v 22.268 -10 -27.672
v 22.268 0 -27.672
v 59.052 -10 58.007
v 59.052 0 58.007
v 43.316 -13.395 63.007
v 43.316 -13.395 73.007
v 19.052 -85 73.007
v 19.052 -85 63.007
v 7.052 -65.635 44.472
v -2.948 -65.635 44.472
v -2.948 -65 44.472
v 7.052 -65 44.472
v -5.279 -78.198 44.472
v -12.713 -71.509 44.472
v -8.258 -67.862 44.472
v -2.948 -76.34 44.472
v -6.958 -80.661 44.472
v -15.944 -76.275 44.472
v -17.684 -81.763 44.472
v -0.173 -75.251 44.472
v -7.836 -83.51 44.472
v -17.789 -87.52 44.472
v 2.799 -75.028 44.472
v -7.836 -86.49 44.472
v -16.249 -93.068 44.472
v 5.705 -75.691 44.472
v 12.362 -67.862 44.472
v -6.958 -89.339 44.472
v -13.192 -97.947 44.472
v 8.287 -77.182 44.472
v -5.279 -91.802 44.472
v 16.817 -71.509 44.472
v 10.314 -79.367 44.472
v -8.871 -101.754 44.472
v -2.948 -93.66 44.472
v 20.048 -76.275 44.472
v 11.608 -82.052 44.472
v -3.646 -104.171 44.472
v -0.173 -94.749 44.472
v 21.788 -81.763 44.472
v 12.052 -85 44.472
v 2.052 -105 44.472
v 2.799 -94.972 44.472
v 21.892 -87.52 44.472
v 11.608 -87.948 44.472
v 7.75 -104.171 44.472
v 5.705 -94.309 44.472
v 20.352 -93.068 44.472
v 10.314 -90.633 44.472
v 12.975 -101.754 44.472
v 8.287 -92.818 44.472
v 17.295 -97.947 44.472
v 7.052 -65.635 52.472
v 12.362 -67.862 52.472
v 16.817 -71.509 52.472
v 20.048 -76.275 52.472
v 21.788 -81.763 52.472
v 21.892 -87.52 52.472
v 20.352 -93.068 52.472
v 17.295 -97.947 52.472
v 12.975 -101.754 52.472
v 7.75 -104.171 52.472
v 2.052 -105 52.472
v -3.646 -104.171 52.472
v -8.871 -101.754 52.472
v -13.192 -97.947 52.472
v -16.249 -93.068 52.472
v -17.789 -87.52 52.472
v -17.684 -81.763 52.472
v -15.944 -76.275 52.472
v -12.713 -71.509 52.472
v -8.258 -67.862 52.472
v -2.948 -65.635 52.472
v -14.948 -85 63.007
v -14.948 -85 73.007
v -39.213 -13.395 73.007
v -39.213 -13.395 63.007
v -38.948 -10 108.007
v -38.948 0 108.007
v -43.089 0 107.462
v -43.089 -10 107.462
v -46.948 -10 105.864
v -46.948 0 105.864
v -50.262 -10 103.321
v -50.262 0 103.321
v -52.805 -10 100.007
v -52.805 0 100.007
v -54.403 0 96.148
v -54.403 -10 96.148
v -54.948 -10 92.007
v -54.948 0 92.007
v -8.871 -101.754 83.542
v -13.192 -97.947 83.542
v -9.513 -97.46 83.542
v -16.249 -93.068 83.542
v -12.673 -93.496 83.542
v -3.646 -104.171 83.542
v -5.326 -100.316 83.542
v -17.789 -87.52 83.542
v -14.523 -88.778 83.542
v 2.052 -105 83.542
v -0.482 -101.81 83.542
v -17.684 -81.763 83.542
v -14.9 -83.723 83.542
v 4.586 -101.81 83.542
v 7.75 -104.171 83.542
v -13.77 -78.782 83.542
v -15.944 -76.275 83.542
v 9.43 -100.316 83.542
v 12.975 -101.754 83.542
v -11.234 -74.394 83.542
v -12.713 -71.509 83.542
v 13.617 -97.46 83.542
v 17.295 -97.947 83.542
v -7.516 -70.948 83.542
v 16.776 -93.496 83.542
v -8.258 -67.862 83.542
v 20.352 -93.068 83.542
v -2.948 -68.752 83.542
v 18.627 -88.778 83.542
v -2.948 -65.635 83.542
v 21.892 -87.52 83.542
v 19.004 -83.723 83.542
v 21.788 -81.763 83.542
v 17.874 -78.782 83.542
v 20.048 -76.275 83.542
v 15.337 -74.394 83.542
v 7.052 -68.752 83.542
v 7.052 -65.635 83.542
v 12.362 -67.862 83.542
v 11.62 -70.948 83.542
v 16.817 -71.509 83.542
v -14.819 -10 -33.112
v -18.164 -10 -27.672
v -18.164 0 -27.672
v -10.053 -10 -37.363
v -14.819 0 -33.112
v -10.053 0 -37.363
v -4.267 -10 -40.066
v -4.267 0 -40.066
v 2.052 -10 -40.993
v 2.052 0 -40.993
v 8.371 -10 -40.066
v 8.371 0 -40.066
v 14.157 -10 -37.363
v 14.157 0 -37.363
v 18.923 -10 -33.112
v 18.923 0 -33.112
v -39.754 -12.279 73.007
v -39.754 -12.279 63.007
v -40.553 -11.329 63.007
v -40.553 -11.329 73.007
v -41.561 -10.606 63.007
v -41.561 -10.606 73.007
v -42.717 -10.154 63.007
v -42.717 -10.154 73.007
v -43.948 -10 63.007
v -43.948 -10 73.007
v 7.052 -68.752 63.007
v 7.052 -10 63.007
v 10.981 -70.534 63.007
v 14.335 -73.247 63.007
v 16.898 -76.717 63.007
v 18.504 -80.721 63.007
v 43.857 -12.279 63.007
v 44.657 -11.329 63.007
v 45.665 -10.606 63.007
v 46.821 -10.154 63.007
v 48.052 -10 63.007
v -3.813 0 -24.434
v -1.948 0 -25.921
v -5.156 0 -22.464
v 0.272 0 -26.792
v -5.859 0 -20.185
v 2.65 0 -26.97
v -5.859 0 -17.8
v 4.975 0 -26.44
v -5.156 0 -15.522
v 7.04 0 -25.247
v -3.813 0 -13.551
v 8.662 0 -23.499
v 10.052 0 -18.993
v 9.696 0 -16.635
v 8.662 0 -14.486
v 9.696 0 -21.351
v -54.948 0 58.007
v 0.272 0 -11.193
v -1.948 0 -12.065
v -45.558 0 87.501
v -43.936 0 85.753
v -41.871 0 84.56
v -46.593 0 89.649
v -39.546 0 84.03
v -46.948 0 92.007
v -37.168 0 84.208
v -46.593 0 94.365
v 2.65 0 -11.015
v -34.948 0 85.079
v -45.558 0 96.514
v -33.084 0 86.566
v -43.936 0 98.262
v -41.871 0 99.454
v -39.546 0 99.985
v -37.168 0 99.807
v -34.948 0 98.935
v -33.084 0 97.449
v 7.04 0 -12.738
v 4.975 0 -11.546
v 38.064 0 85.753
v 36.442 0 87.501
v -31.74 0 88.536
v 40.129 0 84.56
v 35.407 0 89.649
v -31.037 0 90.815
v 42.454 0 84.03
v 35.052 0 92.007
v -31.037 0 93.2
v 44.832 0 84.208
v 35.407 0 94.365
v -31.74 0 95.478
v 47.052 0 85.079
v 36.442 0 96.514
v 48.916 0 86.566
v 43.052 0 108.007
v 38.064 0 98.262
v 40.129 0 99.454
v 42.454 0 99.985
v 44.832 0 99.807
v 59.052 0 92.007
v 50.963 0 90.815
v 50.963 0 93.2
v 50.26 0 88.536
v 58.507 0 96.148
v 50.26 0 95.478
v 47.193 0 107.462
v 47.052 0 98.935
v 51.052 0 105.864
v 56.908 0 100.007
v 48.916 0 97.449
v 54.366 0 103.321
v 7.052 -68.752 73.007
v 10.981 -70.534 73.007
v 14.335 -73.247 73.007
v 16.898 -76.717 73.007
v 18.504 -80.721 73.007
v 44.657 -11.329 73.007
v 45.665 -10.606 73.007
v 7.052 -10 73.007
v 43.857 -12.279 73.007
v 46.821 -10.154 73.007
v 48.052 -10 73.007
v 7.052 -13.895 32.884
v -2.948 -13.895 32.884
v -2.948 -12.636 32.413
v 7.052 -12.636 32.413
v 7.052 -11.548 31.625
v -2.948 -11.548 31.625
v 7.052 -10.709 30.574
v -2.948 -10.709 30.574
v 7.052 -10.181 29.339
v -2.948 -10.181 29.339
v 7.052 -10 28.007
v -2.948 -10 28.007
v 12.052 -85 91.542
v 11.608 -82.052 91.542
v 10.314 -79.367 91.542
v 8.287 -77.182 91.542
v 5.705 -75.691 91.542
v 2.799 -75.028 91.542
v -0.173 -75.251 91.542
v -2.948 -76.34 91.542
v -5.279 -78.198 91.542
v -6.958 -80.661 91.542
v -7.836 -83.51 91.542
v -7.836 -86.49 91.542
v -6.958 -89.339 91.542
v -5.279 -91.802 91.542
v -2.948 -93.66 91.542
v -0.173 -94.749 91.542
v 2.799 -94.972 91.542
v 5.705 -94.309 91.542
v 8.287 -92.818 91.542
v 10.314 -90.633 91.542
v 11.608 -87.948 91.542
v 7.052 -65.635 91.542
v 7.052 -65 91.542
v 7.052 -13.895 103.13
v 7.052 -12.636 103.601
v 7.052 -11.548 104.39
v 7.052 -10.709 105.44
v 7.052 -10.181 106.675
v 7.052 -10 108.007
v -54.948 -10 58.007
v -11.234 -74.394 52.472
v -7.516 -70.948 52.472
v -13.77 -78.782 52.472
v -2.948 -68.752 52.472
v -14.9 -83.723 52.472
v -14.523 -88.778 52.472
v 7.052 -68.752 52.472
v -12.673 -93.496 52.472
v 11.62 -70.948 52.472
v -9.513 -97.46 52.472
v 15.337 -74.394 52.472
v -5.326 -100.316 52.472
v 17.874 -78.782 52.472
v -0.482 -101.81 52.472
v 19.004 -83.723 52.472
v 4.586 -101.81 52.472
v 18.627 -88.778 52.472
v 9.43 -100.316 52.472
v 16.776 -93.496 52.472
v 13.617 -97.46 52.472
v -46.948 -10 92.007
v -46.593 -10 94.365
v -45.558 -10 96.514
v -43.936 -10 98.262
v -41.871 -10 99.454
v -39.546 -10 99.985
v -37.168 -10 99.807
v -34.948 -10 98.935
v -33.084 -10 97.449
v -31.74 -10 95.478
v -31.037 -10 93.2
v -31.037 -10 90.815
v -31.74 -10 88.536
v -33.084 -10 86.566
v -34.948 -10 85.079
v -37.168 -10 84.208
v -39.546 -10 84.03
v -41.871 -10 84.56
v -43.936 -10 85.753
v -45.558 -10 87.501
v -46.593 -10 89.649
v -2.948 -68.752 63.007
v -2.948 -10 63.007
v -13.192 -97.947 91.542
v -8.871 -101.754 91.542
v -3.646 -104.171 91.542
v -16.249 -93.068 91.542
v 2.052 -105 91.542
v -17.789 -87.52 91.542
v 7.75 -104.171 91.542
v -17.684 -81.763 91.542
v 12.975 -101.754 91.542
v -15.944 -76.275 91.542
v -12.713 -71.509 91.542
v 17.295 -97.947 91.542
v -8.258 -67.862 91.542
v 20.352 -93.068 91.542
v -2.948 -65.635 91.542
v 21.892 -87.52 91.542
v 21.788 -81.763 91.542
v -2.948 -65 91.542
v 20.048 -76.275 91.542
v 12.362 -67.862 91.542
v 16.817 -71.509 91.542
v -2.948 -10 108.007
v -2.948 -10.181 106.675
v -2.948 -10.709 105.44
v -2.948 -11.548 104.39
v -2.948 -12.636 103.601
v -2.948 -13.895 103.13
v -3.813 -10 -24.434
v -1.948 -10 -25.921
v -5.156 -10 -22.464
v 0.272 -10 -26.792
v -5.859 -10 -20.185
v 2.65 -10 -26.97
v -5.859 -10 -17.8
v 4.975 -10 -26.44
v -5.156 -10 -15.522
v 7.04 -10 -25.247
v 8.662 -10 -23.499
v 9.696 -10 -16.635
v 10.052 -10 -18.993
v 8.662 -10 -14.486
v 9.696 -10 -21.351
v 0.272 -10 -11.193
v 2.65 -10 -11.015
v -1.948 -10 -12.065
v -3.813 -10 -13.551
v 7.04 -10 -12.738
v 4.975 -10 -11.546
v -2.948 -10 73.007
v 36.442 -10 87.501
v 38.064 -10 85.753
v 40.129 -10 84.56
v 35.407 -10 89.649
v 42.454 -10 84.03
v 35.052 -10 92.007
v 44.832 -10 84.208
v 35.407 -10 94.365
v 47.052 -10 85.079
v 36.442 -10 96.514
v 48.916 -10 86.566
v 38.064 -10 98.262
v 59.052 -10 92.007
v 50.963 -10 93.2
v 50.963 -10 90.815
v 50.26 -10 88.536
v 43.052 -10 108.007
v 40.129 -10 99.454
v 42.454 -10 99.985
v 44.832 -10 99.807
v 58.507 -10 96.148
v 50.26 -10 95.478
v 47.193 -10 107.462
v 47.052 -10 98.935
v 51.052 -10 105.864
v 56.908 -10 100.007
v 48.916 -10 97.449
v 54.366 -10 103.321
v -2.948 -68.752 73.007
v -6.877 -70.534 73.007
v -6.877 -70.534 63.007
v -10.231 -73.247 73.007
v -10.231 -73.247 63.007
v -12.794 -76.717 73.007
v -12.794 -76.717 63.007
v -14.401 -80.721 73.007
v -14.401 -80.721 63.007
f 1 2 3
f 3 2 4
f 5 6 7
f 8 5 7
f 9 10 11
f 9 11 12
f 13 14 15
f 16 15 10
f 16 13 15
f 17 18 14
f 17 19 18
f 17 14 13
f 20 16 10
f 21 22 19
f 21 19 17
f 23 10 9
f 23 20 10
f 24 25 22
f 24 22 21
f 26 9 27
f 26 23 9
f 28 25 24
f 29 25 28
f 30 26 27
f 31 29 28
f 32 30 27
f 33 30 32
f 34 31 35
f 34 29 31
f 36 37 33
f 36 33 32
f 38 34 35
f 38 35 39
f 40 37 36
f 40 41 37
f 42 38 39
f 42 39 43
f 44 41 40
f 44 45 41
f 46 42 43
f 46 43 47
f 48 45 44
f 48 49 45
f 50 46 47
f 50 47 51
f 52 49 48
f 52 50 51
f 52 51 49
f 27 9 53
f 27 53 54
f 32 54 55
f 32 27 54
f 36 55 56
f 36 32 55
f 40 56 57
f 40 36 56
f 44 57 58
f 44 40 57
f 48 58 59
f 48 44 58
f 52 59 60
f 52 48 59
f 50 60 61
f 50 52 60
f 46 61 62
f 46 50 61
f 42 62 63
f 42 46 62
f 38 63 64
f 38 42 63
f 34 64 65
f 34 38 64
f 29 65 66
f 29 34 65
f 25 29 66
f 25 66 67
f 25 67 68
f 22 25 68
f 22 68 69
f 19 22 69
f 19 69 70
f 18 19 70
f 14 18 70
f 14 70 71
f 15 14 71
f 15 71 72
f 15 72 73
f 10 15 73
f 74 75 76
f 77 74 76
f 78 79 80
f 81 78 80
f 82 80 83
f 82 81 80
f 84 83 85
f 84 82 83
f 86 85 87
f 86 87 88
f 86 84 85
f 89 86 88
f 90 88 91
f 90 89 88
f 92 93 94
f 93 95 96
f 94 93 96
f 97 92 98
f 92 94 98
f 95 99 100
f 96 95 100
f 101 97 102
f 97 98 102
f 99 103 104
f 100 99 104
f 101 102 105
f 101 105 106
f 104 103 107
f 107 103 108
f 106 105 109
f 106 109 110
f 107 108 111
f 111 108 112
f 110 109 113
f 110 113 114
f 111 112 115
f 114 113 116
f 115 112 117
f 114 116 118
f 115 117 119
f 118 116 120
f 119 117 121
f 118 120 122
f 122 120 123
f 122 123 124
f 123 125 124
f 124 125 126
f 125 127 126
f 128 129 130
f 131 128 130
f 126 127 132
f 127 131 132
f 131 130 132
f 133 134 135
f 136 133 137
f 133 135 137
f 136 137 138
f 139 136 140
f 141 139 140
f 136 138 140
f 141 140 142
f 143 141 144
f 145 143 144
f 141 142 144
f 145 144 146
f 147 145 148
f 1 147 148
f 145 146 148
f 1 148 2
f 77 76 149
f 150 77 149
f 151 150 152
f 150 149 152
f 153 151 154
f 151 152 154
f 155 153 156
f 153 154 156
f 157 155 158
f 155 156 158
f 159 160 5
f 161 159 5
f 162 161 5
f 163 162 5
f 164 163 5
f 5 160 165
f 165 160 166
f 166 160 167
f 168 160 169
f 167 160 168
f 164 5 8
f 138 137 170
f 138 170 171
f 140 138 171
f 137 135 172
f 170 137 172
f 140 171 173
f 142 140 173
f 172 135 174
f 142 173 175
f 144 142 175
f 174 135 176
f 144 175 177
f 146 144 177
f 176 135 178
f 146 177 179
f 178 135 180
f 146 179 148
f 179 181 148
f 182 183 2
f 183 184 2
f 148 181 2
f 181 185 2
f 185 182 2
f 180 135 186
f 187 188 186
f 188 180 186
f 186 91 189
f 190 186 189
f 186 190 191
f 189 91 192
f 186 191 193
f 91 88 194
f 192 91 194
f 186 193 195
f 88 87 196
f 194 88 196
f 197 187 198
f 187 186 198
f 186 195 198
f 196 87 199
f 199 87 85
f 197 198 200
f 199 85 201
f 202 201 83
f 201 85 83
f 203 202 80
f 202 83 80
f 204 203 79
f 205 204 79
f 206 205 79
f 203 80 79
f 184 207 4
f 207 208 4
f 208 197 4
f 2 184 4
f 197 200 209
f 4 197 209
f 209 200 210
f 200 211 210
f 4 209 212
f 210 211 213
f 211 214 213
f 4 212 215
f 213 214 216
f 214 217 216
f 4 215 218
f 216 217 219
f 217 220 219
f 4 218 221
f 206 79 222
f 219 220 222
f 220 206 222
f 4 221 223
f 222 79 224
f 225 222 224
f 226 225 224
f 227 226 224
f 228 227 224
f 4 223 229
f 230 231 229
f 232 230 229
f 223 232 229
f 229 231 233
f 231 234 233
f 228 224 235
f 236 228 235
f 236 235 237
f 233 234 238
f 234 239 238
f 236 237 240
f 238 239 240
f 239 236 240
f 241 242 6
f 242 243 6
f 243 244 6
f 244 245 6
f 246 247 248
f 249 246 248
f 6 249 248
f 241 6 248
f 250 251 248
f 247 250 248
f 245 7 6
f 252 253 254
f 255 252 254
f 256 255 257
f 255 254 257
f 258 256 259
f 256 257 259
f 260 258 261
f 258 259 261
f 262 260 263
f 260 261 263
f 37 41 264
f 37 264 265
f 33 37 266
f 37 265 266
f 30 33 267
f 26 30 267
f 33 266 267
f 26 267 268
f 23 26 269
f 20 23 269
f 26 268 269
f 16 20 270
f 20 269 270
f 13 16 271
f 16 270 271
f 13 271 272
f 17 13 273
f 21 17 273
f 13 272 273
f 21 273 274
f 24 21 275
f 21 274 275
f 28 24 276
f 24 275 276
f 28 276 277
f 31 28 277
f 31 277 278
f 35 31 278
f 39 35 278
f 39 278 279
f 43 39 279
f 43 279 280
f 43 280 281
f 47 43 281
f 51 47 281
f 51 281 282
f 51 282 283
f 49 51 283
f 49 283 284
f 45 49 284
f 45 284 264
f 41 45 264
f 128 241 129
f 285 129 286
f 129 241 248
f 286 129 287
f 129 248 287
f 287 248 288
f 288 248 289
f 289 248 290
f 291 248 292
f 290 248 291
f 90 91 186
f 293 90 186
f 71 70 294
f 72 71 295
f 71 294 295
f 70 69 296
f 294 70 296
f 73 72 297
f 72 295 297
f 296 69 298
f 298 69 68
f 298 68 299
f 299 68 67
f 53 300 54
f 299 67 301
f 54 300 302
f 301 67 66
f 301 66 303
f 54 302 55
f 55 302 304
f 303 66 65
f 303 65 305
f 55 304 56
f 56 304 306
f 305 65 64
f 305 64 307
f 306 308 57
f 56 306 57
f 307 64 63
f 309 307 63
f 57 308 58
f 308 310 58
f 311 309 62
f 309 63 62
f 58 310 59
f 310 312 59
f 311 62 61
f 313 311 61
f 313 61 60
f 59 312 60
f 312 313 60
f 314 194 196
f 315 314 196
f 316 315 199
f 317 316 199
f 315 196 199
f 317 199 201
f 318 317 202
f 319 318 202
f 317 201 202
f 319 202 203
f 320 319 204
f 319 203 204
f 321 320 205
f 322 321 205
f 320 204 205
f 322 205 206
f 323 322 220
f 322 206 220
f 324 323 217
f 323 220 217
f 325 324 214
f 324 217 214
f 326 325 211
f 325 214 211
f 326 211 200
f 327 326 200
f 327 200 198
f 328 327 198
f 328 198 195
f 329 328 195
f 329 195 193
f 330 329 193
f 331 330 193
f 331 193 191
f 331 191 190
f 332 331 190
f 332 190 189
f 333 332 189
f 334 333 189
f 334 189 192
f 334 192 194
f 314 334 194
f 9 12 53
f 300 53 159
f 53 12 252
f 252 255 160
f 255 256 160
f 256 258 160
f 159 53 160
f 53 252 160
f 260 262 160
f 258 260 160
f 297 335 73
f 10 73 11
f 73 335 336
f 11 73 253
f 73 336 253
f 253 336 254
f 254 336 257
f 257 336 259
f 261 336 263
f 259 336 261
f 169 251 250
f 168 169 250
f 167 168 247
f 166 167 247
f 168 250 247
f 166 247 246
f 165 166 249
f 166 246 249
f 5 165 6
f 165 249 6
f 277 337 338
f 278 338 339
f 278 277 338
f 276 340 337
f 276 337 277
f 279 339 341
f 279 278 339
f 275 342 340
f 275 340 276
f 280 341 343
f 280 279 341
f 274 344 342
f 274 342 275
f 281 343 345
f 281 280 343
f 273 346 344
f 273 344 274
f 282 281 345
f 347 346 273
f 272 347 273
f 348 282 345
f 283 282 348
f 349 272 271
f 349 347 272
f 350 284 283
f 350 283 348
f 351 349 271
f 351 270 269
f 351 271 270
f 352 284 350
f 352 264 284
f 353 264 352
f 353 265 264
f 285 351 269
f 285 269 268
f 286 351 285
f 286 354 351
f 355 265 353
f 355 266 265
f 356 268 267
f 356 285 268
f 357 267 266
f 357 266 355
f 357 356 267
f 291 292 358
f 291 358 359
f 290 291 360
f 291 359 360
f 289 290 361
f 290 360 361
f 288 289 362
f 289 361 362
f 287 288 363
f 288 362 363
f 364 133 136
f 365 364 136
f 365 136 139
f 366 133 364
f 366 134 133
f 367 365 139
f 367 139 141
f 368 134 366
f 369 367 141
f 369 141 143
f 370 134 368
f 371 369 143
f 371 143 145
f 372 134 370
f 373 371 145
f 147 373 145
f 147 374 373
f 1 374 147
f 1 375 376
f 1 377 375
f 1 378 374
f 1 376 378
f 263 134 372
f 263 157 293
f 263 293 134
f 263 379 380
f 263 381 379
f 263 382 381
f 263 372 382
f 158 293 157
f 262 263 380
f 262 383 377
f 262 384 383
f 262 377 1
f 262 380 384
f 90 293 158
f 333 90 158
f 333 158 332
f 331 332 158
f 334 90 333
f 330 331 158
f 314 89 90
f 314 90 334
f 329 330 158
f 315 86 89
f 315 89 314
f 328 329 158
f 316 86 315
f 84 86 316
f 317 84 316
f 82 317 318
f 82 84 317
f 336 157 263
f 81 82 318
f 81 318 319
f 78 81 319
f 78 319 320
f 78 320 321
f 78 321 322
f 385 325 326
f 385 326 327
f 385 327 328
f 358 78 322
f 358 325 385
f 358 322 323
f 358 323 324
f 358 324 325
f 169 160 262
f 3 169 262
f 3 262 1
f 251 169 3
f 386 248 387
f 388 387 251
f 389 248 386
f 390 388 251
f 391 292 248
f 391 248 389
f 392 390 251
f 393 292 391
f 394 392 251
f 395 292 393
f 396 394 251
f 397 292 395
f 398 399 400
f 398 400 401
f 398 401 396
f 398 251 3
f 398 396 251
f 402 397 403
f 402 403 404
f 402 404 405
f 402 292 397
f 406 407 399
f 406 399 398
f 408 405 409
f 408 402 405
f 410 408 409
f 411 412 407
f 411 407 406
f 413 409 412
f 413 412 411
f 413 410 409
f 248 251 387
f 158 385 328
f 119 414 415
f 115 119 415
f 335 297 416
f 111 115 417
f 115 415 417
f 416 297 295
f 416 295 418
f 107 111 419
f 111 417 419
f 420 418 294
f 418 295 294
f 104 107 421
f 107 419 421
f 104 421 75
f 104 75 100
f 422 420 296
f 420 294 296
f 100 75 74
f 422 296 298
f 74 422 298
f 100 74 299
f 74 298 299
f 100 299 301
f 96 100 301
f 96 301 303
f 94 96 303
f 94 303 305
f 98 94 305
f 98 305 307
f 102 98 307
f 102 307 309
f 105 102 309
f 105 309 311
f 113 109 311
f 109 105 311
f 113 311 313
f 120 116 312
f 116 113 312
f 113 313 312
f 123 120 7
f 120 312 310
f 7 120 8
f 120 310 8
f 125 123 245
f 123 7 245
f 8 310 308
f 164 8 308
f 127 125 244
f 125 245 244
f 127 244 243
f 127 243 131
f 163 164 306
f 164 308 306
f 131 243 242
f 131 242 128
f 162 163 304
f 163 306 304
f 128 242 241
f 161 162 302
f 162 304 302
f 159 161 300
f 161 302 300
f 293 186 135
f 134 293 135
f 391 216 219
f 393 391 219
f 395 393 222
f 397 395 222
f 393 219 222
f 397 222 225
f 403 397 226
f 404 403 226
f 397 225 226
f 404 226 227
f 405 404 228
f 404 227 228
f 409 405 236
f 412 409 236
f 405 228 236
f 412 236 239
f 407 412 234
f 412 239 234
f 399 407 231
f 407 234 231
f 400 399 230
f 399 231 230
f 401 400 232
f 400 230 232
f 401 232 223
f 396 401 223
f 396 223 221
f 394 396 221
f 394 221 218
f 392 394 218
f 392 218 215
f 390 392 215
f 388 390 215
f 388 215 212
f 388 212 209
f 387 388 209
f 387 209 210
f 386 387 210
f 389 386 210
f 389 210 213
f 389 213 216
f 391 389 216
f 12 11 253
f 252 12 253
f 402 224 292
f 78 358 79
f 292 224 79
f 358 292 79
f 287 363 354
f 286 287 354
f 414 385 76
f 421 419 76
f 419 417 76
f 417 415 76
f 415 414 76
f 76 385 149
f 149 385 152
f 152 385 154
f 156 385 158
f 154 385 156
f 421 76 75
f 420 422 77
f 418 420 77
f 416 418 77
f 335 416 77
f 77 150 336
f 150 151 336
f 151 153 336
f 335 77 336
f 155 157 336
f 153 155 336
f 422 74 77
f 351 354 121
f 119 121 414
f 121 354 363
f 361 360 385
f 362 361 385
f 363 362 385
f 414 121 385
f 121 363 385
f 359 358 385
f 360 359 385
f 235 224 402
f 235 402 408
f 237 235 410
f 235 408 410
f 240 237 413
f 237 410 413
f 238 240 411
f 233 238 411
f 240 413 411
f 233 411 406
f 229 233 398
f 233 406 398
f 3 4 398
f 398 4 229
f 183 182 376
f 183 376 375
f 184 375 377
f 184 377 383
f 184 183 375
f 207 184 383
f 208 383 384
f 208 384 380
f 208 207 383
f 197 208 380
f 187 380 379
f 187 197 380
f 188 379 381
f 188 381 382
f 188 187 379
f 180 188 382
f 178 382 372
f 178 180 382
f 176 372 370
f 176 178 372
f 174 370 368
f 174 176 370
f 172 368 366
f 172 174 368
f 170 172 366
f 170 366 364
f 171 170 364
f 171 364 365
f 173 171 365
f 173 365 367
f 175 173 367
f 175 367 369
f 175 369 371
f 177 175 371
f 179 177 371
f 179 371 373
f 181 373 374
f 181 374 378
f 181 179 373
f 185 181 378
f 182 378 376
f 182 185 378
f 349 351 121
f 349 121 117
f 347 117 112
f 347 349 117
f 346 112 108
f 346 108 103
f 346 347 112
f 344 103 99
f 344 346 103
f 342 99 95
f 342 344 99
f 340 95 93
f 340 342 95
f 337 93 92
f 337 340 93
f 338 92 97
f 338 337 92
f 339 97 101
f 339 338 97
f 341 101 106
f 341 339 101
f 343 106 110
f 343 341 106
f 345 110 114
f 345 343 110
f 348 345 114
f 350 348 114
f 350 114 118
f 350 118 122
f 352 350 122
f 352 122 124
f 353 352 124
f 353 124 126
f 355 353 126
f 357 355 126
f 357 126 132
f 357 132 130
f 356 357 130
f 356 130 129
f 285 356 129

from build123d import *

# Parameters (mm, degrees)
F0_R      = 8
F1_DEPTH  = 10
F2_R      = 16
F3_R      = 8
F4_DEPTH  = 10.001
F6_DEPTH  = 75
F8_DEPTH  = 62.001
F9_R      = 20
F10_DEPTH = 8
F11_R     = 20
F12_DEPTH = 8
F13_R     = 17
F14_DEPTH = 38
F15_R     = 10
F16_DEPTH = 114.001
F17_W     = 12
F17_H     = 10
F18_DEPTH = 75
F19_R     = 10
F20_DEPTH = 132.536
F22_DEPTH = 10


with BuildPart() as f1:
    # F0 (on Front) → F1 (new body)
    with BuildSketch(Plane.XZ):
        with BuildLine():
            Line((59.051879, 108.007187), (-54.948121, 108.007187))
            Line((-54.948121, 108.007187), (-54.948121, 58.007187))
            Line((-54.948121, 58.007187), (-18.163779, -27.671937))
            ThreePointArc((-18.163779, -27.671937), (2.051879, -40.992813), (22.267536, -27.671937))
            Line((22.267536, -27.671937), (59.051879, 58.007187))
            Line((59.051879, 58.007187), (59.051879, 108.007187))
        make_face()
        with Locations((2.051879, -18.992813)):
            Circle(F0_R, mode=Mode.SUBTRACT)
    extrude(amount=F1_DEPTH)

    # F2
    f2_edges = [f1.edges().sort_by_distance(p)[0] for p in [
        (-54.948121, -5, 108.007187),
        (59.051879, -5, 108.007187),
    ]]
    fillet(f2_edges, radius=F2_R)

    # F3 (on face) → F4 (cut, through all)
    with BuildSketch(Plane(origin=(0, 0, 0), x_dir=(-1, 0, 0), z_dir=(0, 1, 0))):
        with Locations((-43.051879, 92.007187)):
            Circle(F3_R)
        with Locations((38.948121, 92.007187)):
            Circle(F3_R)
    extrude(amount=-F4_DEPTH, mode=Mode.SUBTRACT)

    # F5 (on face) → F6 (join)
    with BuildSketch(Plane.XZ.offset(10)):
        Polygon((7.051879, 108.007187), (2.051879, 108.007187), (-2.948121, 108.007187), (-2.948121, 28.007187), (7.051879, 28.007187), align=None)
    extrude(amount=F6_DEPTH)

    # F7 (on face) → F8 (cut, through all)
    with BuildSketch(Plane(origin=(-2.948121, 0, 0), x_dir=(0, -1, 0), z_dir=(-1, 0, 0))):
        with BuildLine():
            Line((85, 108.007187), (10, 108.007187))
            ThreePointArc((10, 108.007187), (11.093214, 104.886516), (13.894876, 103.130274))
            Line((13.894876, 103.130274), (65, 91.542187))
            Line((65, 91.542187), (85, 91.542187))
            Line((85, 91.542187), (85, 108.007187))
        make_face()
        with BuildLine():
            ThreePointArc((13.894876, 32.8841), (11.093214, 31.127858), (10, 28.007187))
            Line((10, 28.007187), (85, 28.007187))
            Line((85, 28.007187), (85, 44.472187))
            Line((85, 44.472187), (65, 44.472187))
            Line((65, 44.472187), (13.894876, 32.8841))
        make_face()
    extrude(amount=-F8_DEPTH, mode=Mode.SUBTRACT)

    # F9 (on face) → F10 (join)
    with BuildSketch(Plane.XY.offset(91.542187)):
        with Locations((2.051879, -85)):
            Circle(F9_R)
    extrude(amount=-F10_DEPTH)

    # F11 (on face) → F12 (join)
    with BuildSketch(Plane(origin=(0, 0, 44.472187), x_dir=(1, 0, 0), z_dir=(0, 0, -1))):
        with Locations((2.051879, 85)):
            Circle(F11_R)
    extrude(amount=-F12_DEPTH)

    # F13 (on face) → F14 (join)
    with BuildSketch(Plane.XY.offset(52.472187)):
        with Locations((2.051879, -85)):
            Circle(F13_R)
    extrude(amount=F14_DEPTH)

    # F15 (on face) → F16 (cut, through all)
    with BuildSketch(Plane.XY.offset(73.007187)):
        with Locations((2.051879, -85)):
            Circle(F15_R)
    extrude(amount=-F16_DEPTH, mode=Mode.SUBTRACT)

    # F17 (on face) → F18 (join)
    with BuildSketch(Plane.XZ.offset(10)):
        Polygon((-43.948121, 73.007187), (-43.948121, 68.007187), (-43.948121, 63.007187), (-14.948121, 63.007187), (-14.948121, 73.007187), align=None)
        with Locations((-8.948121, 68.007187)):
            Rectangle(F17_W, F17_H)
        Polygon((19.051879, 63.007187), (48.051879, 63.007187), (48.051879, 73.007187), (19.051879, 73.007187), (7.051879, 73.007187), (7.051879, 63.007187), align=None)
    extrude(amount=F18_DEPTH)

    # F19 (on face) → F20 (cut, through all)
    with BuildSketch(Plane.XY.offset(91.542187)):
        with Locations((2.051879, -85)):
            Circle(F19_R)
    extrude(amount=-F20_DEPTH, mode=Mode.SUBTRACT)

    # F21 (on face) → F22 (cut)
    with BuildSketch(Plane.XY.offset(73.007187)):
        with BuildLine():
            Line((48.051879, -85), (48.051879, -10))
            ThreePointArc((48.051879, -10), (45.138421, -10.936533), (43.316383, -13.395295))
            Line((43.316383, -13.395295), (19.051879, -85))
            Line((19.051879, -85), (48.051879, -85))
        make_face()
        with BuildLine():
            Line((-43.948121, -85), (-14.948121, -85))
            Line((-14.948121, -85), (-39.212626, -13.395295))
            ThreePointArc((-39.212626, -13.395295), (-41.034663, -10.936533), (-43.948121, -10))
            Line((-43.948121, -10), (-43.948121, -85))
        make_face()
    extrude(amount=-F22_DEPTH, mode=Mode.SUBTRACT)


solid = f1.part
